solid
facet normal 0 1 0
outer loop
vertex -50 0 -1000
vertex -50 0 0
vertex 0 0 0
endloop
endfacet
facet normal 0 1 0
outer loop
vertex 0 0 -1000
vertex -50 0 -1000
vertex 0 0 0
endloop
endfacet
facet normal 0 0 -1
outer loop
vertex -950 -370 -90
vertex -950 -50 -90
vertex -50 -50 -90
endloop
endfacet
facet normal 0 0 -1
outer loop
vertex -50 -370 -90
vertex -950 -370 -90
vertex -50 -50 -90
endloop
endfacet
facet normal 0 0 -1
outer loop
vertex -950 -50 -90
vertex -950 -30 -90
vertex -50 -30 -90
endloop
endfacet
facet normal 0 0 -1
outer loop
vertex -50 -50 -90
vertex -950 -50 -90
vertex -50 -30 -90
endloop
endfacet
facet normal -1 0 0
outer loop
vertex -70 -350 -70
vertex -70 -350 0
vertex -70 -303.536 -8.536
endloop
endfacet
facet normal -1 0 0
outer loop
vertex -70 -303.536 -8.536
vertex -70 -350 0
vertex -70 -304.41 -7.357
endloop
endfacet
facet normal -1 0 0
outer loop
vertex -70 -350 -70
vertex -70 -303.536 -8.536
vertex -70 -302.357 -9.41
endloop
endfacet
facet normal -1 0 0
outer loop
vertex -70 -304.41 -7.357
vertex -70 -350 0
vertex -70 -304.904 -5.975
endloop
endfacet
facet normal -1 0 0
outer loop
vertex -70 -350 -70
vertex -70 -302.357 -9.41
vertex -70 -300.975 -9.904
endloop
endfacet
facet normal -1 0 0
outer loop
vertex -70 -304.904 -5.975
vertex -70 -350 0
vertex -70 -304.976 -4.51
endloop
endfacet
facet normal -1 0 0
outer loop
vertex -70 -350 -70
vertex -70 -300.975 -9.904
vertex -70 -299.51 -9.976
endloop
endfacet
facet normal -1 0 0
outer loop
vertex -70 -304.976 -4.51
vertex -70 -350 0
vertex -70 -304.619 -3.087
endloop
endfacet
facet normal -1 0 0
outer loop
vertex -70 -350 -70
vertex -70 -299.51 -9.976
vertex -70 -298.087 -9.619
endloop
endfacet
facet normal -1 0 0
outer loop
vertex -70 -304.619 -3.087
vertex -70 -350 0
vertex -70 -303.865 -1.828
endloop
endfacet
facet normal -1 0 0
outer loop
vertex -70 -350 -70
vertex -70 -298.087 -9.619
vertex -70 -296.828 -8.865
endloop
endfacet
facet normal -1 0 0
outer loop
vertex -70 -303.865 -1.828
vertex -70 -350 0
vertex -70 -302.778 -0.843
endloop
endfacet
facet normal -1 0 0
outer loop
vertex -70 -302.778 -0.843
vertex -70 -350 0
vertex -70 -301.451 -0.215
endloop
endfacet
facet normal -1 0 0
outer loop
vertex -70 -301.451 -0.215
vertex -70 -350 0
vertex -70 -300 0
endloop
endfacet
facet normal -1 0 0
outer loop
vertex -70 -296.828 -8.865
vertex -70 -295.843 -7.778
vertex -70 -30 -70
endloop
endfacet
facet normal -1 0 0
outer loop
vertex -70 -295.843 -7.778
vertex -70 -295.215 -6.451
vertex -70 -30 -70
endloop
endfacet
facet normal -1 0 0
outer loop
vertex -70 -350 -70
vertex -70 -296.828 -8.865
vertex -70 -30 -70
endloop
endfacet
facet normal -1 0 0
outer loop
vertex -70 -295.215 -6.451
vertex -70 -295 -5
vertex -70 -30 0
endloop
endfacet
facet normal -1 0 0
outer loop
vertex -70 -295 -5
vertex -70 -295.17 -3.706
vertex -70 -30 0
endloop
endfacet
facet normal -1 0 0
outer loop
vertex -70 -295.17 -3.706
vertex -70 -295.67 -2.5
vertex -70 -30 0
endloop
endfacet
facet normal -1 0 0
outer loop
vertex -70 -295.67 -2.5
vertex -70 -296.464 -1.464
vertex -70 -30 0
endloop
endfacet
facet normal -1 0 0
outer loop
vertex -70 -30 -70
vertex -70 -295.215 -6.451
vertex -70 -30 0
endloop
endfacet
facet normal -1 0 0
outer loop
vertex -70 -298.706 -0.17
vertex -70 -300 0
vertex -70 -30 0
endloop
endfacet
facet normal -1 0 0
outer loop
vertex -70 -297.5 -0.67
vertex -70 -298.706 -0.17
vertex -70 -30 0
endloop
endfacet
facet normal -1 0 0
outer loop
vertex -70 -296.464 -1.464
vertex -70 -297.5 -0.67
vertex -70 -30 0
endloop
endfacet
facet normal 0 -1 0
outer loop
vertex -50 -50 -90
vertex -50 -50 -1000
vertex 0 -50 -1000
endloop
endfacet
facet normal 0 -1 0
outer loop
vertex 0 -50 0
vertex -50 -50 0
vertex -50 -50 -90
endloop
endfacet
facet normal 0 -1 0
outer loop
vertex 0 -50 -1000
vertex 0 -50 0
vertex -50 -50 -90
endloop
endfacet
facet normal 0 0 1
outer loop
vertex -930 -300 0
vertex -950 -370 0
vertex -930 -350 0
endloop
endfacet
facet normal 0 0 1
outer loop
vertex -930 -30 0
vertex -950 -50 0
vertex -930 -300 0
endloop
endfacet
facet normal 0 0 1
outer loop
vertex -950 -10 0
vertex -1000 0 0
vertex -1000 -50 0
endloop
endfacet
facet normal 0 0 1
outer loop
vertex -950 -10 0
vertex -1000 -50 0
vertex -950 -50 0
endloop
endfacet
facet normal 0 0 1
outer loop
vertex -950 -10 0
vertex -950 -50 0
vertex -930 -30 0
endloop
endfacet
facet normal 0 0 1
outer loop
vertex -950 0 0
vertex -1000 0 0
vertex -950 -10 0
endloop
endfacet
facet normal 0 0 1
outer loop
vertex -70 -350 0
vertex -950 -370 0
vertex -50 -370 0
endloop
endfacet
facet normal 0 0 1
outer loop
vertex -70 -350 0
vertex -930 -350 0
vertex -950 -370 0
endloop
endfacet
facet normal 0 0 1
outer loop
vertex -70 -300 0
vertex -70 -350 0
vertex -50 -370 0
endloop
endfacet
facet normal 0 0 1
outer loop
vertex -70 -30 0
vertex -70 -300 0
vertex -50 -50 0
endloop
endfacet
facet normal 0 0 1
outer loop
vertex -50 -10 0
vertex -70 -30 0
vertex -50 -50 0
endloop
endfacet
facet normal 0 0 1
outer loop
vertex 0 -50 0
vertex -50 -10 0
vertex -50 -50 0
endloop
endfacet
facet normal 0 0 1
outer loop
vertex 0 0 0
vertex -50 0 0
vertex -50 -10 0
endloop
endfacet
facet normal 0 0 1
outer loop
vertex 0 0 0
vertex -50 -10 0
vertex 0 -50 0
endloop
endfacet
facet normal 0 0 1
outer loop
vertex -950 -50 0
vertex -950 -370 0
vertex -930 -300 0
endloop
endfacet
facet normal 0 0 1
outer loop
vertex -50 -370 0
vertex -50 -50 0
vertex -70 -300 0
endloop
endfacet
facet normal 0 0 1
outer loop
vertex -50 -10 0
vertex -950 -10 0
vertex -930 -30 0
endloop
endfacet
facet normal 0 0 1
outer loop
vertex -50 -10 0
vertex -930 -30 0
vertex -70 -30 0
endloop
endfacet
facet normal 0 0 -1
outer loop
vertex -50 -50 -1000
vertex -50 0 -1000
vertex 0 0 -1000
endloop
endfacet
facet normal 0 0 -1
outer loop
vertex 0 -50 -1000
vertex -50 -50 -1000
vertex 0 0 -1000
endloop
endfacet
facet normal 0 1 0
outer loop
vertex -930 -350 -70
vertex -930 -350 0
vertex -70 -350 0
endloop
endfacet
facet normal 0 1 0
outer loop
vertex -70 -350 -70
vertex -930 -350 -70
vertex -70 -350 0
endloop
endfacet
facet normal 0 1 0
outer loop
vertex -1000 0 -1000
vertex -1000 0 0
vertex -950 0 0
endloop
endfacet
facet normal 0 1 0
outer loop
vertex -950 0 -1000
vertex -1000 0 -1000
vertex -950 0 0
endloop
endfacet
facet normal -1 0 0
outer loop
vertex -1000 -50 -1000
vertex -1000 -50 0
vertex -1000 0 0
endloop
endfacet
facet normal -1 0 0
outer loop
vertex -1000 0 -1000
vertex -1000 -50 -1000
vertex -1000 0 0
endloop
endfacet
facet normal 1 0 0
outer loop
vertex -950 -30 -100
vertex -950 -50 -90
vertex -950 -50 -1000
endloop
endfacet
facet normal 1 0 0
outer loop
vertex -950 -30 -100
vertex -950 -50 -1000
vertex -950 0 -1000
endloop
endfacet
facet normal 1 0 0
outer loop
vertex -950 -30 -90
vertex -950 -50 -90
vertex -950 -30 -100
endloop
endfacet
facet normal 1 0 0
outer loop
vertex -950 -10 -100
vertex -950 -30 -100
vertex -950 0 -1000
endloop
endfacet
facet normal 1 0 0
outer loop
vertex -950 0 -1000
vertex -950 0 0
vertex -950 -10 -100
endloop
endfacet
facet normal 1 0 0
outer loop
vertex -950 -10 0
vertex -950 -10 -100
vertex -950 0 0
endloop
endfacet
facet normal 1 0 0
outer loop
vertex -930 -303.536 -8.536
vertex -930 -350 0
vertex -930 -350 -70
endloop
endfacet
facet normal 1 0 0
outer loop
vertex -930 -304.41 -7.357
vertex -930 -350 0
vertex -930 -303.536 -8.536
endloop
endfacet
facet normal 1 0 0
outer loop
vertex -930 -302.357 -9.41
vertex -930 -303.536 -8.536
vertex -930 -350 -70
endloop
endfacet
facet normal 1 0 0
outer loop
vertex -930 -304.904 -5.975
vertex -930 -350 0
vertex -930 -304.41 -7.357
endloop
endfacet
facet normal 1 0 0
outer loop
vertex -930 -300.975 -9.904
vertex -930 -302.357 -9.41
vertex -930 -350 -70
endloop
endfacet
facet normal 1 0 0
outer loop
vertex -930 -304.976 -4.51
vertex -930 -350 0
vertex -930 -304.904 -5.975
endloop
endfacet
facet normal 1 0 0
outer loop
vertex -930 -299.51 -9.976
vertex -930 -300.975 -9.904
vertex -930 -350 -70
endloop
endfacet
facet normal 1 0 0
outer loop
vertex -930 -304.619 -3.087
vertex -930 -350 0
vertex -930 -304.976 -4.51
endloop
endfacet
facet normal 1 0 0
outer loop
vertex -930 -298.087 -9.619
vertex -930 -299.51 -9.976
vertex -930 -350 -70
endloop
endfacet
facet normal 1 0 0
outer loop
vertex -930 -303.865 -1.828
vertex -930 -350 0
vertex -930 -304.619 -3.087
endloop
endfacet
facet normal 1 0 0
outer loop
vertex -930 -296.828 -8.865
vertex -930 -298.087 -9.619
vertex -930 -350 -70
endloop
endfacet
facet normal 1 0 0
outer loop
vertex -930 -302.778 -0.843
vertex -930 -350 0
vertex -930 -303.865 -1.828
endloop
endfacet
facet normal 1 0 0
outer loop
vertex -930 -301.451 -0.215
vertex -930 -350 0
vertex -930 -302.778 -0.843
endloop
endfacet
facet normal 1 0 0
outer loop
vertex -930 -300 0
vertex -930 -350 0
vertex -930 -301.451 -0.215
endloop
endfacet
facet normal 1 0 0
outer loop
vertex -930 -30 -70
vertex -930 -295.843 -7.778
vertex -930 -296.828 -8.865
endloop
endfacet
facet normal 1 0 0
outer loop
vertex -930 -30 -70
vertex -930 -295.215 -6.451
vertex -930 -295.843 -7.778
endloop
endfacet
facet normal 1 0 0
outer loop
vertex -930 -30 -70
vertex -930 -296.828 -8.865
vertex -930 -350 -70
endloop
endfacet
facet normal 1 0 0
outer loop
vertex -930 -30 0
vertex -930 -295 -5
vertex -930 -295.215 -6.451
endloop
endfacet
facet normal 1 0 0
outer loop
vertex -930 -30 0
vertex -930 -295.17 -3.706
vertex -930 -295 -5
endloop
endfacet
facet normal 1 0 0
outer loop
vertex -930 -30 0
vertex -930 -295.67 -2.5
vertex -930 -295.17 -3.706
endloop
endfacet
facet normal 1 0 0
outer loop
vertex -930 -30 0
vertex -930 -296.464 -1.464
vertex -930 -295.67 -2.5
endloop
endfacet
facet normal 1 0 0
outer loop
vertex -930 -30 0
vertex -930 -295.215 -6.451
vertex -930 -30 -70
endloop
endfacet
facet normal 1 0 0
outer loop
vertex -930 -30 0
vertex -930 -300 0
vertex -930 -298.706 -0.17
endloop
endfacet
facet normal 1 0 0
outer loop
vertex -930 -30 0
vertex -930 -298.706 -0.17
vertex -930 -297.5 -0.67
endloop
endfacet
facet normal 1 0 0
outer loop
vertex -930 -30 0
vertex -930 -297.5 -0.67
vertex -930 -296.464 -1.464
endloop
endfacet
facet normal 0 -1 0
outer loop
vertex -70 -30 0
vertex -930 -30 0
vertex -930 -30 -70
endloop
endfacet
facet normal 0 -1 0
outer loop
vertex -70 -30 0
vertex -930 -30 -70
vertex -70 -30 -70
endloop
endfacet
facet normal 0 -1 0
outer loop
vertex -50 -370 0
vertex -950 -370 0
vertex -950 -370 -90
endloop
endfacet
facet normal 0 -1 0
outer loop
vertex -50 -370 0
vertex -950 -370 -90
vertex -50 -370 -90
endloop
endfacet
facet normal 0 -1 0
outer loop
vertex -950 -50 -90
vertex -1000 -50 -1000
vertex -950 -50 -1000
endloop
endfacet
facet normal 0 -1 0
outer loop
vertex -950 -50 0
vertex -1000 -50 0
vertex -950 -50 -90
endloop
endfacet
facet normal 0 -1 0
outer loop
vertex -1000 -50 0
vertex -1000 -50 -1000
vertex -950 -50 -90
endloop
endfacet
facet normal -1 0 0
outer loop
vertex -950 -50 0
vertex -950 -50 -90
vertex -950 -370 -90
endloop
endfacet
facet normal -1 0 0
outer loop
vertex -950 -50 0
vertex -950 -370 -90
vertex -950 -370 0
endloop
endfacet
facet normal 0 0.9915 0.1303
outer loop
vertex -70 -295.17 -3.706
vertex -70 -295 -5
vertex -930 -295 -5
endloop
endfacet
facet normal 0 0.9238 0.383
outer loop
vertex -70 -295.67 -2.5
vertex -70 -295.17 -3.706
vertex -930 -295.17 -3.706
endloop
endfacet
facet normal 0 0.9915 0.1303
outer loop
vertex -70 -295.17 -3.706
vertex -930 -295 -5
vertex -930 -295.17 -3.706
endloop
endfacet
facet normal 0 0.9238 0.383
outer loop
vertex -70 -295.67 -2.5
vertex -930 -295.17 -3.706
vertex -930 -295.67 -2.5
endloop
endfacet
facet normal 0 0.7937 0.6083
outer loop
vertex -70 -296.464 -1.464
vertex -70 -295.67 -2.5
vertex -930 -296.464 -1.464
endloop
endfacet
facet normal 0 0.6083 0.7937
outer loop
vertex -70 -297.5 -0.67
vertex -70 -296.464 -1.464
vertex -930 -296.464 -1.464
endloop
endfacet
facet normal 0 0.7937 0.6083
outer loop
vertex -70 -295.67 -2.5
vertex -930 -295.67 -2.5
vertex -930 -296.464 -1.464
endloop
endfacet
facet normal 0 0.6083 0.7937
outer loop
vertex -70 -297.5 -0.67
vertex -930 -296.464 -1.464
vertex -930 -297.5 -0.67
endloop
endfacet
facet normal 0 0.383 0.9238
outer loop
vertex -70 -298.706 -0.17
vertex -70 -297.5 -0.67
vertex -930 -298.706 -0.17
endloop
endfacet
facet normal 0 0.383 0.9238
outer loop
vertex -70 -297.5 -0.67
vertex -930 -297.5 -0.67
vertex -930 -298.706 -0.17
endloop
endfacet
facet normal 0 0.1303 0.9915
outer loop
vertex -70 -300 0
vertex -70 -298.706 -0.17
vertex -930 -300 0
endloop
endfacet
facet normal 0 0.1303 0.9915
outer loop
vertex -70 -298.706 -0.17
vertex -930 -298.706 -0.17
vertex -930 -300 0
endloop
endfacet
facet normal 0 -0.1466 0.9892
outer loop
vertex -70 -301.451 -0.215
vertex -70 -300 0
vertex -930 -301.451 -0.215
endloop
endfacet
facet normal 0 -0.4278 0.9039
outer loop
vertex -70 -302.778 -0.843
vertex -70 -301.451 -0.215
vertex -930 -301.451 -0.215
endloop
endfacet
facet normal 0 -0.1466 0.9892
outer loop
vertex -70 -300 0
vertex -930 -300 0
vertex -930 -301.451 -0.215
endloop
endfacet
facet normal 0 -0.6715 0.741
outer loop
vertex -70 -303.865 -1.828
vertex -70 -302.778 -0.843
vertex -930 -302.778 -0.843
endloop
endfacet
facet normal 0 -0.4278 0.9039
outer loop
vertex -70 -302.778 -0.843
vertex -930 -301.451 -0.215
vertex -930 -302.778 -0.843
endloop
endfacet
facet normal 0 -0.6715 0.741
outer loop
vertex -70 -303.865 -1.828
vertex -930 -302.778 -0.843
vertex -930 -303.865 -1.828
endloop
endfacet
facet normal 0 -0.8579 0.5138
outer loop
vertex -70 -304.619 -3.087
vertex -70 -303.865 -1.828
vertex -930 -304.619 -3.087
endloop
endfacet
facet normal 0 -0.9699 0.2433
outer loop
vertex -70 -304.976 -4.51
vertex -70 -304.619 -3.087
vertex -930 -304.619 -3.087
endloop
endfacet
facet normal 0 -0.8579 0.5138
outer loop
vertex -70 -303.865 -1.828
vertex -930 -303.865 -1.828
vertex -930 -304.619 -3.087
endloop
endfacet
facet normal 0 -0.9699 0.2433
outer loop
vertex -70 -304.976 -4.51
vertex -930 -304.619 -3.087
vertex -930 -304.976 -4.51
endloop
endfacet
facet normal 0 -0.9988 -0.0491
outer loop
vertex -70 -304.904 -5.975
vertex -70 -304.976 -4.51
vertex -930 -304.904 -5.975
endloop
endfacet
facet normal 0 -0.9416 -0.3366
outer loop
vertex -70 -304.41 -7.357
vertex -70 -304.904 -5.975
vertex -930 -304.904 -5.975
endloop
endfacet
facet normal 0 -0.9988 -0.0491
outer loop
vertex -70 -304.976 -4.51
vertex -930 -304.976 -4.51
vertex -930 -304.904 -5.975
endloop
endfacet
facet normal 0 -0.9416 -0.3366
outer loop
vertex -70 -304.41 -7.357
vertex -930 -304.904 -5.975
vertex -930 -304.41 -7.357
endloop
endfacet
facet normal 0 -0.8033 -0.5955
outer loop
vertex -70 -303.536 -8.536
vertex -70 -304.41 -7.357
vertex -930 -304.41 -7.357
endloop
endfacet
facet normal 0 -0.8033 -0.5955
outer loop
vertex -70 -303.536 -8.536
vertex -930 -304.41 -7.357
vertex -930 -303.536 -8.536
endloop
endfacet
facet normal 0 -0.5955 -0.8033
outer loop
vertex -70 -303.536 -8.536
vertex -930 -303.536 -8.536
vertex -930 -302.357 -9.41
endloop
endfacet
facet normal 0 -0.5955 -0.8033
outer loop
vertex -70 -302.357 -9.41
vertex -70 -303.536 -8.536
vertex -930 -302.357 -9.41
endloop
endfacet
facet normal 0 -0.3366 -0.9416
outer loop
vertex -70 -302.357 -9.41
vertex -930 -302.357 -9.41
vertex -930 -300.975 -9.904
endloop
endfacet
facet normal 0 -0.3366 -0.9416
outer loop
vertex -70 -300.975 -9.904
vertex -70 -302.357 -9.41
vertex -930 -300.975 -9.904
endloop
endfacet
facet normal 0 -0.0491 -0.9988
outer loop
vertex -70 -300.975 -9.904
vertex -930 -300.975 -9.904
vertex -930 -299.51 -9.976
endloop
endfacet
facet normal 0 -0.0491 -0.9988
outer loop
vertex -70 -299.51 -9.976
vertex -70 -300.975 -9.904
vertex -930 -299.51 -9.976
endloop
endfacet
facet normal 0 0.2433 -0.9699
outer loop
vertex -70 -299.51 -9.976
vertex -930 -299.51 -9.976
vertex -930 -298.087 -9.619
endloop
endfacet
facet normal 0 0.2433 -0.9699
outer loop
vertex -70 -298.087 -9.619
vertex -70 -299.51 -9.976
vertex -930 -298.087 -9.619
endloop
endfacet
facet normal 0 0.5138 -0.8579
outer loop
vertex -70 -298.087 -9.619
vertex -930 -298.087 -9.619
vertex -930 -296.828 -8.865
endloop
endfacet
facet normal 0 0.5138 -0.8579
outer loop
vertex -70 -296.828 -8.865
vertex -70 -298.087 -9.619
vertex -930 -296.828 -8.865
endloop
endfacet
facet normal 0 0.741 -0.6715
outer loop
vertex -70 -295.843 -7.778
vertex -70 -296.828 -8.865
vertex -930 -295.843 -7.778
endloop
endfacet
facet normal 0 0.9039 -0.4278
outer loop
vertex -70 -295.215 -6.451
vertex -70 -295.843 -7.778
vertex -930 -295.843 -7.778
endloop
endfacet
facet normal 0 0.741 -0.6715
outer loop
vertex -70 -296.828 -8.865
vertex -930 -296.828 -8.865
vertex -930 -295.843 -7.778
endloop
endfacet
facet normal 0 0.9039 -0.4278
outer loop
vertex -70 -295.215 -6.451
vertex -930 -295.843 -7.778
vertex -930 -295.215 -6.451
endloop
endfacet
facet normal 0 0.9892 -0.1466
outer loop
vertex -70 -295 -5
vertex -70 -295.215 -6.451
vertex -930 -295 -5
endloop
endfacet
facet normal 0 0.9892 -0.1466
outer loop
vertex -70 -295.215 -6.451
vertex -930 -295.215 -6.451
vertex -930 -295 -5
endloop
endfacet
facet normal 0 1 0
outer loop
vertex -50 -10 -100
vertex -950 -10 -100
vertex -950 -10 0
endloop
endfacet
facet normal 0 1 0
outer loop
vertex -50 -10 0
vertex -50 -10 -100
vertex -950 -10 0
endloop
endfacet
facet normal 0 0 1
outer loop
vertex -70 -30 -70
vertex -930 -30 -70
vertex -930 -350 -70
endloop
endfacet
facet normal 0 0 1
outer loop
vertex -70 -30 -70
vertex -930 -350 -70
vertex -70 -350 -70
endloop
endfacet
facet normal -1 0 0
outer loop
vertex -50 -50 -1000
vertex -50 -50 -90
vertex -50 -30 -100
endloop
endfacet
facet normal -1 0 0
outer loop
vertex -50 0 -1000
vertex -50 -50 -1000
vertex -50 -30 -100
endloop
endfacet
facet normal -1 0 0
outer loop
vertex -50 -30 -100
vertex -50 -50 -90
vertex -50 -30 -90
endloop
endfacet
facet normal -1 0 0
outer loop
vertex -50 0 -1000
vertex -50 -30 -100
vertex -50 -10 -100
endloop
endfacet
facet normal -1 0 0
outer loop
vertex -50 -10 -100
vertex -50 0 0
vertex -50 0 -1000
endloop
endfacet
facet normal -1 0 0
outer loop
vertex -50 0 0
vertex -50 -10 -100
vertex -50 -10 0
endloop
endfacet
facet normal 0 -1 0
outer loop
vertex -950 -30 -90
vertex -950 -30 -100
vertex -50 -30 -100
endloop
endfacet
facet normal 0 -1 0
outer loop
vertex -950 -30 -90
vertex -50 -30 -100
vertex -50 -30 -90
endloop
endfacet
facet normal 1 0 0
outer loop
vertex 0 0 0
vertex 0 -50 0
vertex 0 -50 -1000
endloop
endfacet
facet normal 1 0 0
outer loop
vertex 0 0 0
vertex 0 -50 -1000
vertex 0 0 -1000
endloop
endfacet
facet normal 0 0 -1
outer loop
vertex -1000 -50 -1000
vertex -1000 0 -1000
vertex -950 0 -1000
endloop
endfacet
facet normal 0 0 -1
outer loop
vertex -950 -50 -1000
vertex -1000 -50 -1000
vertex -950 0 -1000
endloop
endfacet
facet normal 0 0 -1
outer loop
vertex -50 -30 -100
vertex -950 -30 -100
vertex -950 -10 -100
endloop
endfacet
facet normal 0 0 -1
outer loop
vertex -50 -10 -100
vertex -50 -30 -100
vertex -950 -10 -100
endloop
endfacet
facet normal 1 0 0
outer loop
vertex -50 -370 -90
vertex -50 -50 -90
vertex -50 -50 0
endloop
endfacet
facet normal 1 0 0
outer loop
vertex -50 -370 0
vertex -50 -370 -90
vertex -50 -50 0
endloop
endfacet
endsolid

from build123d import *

# Parameters (mm, degrees)
F1_W      = 50
F1_H      = 50
F2_DEPTH  = 1000
F3_W      = 20
F3_H      = 100
F4_DEPTH  = 900
F5_W      = 900
F5_H      = 90
F6_DEPTH  = 340
F7_W      = 860
F7_H      = 320
F8_DEPTH  = 70
F9_R      = 5
F10_DEPTH = 860


with BuildPart() as f2:
    # F1 (on Top) → F2 (new body)
    with BuildSketch(Plane.XY):
        with Locations((-25, -25)):
            Rectangle(F1_W, F1_H)
    extrude(amount=-F2_DEPTH)



with BuildPart() as f2b:
    # F1 (on Top) → F2, piece 2 (new body)
    with BuildSketch(Plane.XY):
        with Locations((-975, -25)):
            Rectangle(F1_W, F1_H)
    extrude(amount=-F2_DEPTH)


with BuildPart() as f2_1:
    add(f2.part)

    add(f2b.part)  # F4 merges F2b
    # F3 (on face) → F4 (join, through all)
    with BuildSketch(Plane.YZ.offset(-950)):
        with Locations((-20, -50)):
            Rectangle(F3_W, F3_H)
    extrude(amount=F4_DEPTH)

    # F5 (on face) → F6 (join)
    with BuildSketch(Plane.XZ.offset(30)):
        with Locations((-500, -45)):
            Rectangle(F5_W, F5_H)
    extrude(amount=F6_DEPTH)

    # F7 (on face) → F8 (cut)
    with BuildSketch(Plane.XY):
        with Locations((-500, -190)):
            Rectangle(F7_W, F7_H)
    extrude(amount=-F8_DEPTH, mode=Mode.SUBTRACT)

    # F9 (on face) → F10 (join, through all)
    with BuildSketch(Plane.YZ.offset(-930)):
        with Locations((-300, -5)):
            Circle(F9_R)
    extrude(amount=F10_DEPTH)


solid = f2_1.part
